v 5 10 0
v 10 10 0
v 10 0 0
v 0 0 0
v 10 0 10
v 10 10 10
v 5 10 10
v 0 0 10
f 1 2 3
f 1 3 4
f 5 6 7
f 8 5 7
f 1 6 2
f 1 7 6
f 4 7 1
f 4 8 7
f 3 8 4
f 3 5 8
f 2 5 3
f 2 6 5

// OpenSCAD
linear_extrude(height=10) polygon([[0,0],[10,0],[10,10],[5,10]]);//extruded polygon
